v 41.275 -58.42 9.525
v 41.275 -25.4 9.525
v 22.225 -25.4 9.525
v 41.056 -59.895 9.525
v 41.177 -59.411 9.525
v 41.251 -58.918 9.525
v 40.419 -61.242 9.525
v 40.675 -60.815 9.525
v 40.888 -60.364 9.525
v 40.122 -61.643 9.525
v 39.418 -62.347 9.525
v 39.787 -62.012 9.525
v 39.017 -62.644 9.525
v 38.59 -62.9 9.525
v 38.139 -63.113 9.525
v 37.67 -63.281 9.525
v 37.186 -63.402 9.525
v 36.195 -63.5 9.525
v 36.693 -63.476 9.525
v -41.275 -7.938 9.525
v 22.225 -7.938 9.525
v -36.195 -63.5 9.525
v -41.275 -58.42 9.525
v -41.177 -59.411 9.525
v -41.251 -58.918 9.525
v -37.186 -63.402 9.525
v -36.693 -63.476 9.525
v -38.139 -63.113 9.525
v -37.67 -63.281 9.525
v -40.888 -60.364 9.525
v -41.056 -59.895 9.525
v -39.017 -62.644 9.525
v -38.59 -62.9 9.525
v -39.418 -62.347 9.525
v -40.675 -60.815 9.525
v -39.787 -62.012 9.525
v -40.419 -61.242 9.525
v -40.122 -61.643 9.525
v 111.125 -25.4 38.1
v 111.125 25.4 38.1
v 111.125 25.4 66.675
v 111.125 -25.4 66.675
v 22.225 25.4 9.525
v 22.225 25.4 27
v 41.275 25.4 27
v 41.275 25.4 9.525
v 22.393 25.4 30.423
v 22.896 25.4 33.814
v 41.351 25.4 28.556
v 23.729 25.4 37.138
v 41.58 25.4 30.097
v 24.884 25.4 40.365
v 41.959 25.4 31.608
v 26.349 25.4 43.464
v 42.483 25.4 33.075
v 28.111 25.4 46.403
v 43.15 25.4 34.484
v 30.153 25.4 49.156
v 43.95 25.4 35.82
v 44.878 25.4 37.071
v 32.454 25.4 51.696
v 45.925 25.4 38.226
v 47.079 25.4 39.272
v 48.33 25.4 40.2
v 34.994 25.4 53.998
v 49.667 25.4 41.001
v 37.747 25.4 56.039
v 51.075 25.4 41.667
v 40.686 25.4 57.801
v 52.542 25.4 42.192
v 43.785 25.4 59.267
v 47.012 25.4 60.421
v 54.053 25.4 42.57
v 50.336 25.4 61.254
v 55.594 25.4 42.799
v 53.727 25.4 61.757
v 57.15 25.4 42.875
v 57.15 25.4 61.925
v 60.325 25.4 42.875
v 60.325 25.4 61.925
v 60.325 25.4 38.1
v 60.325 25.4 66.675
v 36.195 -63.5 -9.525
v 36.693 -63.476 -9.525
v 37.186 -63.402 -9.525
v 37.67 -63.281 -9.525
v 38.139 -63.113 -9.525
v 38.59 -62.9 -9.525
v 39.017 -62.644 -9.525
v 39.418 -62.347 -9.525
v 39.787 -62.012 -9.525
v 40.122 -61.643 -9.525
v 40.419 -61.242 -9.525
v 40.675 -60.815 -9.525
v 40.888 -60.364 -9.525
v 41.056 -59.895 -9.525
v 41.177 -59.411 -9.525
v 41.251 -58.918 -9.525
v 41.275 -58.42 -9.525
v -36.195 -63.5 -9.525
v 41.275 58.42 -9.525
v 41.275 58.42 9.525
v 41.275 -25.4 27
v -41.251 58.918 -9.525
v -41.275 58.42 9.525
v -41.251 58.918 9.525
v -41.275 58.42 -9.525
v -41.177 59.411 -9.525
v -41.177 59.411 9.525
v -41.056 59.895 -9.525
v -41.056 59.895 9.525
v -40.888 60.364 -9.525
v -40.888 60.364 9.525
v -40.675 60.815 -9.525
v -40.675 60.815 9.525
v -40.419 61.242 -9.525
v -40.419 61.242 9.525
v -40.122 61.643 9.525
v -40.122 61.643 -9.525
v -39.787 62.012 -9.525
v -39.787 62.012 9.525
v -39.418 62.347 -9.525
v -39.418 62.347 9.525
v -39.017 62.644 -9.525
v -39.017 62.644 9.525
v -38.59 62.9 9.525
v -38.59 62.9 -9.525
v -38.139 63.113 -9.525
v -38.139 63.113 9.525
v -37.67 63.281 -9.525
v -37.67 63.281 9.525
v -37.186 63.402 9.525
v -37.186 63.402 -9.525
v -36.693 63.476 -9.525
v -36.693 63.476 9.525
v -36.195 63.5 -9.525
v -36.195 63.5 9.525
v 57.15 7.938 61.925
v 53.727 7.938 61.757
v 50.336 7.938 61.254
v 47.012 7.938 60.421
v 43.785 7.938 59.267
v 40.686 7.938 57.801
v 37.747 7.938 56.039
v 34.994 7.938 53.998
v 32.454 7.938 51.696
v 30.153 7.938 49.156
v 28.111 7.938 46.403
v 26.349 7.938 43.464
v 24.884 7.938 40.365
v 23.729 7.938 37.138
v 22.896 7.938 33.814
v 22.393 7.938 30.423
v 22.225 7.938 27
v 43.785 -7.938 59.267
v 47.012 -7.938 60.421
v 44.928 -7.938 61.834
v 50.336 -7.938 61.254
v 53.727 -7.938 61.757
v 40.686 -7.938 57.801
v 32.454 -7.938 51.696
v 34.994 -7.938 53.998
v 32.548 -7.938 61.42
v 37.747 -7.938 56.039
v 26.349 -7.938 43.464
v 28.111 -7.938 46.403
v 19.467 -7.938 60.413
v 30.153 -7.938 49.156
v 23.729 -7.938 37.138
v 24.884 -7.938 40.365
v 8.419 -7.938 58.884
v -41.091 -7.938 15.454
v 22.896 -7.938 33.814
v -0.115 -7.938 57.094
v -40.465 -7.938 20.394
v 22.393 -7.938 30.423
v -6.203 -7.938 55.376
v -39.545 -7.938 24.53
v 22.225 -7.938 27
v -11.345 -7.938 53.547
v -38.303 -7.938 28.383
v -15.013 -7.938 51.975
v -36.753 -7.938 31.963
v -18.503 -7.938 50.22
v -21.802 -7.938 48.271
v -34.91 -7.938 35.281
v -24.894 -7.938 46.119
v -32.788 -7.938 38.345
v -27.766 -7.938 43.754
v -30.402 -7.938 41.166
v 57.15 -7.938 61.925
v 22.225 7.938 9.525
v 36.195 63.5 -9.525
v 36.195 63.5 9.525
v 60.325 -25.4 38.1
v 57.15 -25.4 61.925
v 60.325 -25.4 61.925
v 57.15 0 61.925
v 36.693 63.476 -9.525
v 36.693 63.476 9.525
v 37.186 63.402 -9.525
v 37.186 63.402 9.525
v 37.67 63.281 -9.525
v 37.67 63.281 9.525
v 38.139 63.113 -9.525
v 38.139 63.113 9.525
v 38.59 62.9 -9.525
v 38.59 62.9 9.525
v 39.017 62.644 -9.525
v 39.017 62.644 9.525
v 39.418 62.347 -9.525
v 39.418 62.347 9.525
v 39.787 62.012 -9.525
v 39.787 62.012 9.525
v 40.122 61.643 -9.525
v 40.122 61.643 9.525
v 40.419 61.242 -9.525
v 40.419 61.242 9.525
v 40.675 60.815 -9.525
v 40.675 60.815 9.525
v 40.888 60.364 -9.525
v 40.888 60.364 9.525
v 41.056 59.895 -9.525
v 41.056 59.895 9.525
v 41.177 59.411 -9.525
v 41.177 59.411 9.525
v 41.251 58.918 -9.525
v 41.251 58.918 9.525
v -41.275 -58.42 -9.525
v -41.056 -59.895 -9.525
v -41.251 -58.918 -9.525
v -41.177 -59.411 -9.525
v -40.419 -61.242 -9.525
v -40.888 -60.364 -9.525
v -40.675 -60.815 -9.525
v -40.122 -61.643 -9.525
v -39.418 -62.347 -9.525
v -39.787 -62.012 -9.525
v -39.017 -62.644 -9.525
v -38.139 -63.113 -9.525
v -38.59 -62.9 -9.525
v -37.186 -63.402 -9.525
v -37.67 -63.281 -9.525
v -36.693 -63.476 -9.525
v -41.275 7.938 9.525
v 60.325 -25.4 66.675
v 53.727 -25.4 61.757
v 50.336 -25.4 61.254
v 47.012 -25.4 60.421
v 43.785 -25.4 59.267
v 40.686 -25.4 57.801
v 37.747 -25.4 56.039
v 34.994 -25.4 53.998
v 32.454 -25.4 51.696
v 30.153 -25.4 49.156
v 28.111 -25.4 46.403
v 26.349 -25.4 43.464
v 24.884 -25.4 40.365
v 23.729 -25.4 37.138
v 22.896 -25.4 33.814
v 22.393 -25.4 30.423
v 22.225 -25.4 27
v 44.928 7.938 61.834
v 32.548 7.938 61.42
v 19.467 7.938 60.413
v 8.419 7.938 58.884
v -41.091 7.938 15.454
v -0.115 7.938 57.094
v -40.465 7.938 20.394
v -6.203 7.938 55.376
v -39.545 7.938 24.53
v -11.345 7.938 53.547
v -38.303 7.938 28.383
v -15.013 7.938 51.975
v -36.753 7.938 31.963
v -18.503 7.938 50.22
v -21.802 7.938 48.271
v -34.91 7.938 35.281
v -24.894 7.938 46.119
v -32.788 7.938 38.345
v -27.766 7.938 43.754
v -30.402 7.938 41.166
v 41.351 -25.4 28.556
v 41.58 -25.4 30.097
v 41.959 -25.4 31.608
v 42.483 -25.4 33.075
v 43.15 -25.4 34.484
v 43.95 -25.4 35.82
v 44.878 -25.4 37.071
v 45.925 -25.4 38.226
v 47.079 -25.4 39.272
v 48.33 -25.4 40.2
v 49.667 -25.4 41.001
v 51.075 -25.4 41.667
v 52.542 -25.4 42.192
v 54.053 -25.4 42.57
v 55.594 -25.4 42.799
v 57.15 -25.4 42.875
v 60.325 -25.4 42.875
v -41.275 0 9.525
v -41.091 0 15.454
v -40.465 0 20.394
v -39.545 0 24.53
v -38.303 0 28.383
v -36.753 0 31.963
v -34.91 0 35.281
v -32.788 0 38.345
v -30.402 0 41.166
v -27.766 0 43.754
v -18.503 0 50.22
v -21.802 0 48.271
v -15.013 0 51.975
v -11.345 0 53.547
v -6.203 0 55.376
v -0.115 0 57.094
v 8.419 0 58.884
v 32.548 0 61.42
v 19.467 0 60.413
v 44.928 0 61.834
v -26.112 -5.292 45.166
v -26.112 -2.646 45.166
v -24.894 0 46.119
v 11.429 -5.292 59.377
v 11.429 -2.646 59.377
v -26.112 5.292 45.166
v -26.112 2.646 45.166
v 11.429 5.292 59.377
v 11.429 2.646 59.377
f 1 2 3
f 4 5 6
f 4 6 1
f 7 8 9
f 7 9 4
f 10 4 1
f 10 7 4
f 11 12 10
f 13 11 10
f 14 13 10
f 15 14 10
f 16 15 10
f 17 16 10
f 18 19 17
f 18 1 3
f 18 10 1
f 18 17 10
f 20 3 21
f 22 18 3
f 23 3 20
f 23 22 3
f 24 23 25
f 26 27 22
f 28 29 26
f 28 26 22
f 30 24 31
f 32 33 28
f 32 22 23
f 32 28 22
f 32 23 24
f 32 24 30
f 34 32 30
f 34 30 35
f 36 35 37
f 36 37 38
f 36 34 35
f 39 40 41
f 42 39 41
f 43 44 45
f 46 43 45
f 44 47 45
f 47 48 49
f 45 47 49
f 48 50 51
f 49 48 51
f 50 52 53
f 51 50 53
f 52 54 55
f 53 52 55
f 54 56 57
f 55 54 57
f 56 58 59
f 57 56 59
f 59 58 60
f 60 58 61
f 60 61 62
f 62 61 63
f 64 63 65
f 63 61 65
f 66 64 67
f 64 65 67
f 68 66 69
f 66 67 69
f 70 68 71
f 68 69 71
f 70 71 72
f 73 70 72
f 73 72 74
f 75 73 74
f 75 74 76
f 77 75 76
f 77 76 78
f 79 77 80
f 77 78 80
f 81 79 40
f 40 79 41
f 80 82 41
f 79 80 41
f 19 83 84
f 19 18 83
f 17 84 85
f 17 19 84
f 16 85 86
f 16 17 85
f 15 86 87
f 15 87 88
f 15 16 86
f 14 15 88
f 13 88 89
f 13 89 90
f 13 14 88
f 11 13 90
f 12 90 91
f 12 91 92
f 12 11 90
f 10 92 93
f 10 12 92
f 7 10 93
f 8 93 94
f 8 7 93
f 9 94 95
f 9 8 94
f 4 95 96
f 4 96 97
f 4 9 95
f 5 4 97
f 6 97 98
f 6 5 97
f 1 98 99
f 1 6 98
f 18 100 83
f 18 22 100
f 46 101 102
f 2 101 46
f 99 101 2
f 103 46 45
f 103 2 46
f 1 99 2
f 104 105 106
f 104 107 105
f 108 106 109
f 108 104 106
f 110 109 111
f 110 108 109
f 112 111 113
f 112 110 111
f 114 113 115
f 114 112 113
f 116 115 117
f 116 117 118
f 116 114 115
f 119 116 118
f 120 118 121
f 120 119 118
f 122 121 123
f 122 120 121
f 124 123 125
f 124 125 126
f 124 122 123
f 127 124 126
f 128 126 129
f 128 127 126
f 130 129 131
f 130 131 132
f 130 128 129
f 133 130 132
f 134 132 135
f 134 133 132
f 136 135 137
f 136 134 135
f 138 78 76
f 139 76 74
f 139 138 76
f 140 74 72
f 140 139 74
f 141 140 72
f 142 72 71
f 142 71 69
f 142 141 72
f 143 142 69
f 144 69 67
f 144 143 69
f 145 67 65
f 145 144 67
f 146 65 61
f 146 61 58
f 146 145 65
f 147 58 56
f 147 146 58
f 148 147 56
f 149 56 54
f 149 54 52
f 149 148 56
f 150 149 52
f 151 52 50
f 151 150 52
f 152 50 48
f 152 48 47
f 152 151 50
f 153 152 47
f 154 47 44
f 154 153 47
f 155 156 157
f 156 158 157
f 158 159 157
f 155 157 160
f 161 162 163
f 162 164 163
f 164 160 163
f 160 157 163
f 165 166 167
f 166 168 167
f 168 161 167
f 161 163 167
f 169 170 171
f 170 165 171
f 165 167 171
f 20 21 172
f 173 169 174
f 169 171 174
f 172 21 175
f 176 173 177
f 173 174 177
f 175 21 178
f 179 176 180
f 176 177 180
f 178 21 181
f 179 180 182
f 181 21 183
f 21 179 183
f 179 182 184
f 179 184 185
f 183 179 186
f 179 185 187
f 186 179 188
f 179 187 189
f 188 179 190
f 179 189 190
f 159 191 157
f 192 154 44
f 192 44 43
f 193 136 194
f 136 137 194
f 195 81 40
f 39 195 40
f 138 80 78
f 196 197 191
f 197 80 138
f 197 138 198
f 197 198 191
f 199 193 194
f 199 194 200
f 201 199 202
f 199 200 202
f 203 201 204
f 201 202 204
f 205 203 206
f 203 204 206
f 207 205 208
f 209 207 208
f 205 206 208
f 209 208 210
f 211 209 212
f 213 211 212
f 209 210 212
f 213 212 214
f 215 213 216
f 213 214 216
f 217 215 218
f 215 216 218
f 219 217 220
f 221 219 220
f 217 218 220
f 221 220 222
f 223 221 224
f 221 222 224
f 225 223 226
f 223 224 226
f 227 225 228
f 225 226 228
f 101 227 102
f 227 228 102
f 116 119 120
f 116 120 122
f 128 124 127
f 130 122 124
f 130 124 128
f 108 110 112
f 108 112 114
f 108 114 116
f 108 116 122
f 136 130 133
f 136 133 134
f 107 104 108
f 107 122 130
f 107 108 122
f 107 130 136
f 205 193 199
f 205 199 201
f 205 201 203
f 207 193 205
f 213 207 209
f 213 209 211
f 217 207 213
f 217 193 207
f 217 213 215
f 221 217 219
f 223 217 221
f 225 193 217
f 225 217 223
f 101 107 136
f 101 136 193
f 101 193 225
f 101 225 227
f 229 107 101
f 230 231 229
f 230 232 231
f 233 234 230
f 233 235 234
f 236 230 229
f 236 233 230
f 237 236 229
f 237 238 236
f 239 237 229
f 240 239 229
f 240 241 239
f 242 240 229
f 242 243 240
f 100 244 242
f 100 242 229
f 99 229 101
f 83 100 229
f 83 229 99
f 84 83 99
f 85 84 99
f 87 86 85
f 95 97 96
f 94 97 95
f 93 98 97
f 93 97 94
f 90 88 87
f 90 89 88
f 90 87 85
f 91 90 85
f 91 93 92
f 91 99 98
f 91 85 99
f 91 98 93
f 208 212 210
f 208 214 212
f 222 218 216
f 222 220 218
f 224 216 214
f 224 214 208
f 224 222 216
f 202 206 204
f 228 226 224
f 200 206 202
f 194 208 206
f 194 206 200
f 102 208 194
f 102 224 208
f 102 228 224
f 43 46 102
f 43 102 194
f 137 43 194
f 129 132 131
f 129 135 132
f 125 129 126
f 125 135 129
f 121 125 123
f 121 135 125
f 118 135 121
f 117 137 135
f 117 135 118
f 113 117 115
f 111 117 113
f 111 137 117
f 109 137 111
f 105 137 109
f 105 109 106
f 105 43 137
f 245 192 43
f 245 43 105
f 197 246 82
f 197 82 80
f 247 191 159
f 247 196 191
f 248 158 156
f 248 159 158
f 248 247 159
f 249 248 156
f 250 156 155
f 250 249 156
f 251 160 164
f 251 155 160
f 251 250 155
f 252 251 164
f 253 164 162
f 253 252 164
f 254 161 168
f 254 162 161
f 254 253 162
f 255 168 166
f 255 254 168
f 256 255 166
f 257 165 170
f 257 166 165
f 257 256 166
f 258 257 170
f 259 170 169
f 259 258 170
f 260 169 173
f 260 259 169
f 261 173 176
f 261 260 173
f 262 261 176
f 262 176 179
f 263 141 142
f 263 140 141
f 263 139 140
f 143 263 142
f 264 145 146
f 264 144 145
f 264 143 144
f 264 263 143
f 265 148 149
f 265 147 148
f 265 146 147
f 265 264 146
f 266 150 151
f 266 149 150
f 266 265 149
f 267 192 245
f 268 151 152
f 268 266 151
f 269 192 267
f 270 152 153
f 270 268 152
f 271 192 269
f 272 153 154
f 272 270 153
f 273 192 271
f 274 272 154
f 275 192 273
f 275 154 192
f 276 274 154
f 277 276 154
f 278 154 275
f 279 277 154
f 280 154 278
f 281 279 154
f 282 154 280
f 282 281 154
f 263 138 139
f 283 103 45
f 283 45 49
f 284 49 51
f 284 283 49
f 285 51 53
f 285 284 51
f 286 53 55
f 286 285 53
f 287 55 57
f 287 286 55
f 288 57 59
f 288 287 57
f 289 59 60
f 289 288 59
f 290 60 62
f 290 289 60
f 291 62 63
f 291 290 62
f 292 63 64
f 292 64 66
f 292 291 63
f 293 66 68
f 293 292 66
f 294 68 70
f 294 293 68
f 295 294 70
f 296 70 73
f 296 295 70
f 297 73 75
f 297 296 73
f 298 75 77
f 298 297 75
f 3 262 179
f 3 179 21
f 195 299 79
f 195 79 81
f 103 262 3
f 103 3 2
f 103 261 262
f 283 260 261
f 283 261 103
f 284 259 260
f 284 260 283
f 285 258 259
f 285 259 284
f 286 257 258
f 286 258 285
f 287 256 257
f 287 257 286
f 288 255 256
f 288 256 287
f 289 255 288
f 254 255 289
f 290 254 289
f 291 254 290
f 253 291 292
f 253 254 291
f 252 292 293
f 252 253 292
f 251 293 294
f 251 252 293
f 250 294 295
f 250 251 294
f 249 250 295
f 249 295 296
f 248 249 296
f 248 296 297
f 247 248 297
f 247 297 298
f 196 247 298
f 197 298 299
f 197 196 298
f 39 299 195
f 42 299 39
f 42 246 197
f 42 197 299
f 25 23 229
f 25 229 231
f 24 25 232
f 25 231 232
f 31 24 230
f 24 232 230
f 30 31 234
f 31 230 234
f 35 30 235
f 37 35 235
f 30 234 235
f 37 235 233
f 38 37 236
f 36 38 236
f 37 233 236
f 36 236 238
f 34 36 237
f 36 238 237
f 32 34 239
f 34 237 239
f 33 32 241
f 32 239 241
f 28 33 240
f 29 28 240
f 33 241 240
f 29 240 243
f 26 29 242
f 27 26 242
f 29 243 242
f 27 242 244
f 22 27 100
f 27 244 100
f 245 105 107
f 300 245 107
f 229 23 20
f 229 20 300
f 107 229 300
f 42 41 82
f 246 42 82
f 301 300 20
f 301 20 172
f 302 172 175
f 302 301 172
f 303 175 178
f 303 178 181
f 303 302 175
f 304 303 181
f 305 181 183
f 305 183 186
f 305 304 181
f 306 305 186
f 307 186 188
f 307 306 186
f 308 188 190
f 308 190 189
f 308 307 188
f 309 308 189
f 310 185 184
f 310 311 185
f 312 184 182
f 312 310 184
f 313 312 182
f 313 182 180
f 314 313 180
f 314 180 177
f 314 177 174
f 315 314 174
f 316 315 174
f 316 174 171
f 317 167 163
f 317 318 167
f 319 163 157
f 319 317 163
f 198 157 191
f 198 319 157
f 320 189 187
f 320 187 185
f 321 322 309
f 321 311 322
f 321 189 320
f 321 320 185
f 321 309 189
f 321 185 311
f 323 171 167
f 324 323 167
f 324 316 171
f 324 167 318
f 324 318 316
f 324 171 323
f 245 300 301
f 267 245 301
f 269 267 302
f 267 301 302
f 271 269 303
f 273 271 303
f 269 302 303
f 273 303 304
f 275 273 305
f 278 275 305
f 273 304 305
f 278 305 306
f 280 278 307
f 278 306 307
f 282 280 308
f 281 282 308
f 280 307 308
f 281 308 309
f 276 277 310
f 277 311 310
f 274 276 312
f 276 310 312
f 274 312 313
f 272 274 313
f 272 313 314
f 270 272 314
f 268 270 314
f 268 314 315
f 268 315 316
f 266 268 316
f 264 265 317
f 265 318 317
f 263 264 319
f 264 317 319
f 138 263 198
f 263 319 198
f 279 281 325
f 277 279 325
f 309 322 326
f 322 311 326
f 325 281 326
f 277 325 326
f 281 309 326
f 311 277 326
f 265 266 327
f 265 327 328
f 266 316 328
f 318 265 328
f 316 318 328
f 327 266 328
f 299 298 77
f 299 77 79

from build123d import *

# Parameters (mm, degrees)
F1_DEPTH = 63.5
F2_DEPTH = 25.4
F3_DEPTH = 7.9375
F4_R     = 5.08


with BuildPart() as f1:
    # F0 (on Front) → F1 (new body, symmetric)
    with BuildSketch(Plane.XZ):
        Polygon((22.225, 9.525), (-41.275, 9.525), (-41.275, -9.525), (41.275, -9.525), (41.275, 9.525), align=None)
    extrude(amount=F1_DEPTH, both=True)

    # F0 (on Front) → F2 (join, symmetric)
    with BuildSketch(Plane.XZ):
        with BuildLine():
            Line((22.225, 27.0002), (22.225, 9.525))
            Line((22.225, 9.525), (41.275, 9.525))
            Line((41.275, 9.525), (41.275, 27.0002))
            ThreePointArc((41.275, 27.0002), (45.92468, 38.22552), (57.15, 42.8752))
            Line((57.15, 42.8752), (60.325, 42.8752))
            Line((60.325, 42.8752), (60.325, 61.9252))
            Line((60.325, 61.9252), (57.15, 61.9252))
            ThreePointArc((57.15, 61.9252), (32.454296, 51.695904), (22.225, 27.0002))
        make_face()
        Polygon((60.325, 66.675), (60.325, 61.9252), (60.325, 42.8752), (60.325, 38.1), (111.125, 38.1), (111.125, 66.675), align=None)
    extrude(amount=F2_DEPTH, both=True)

    # F0 (on Front) → F3 (join, symmetric)
    with BuildSketch(Plane.XZ):
        with BuildLine():
            add(Edge.make_bspline(
                [(-41.275, 9.525), (-42.032037, 59.136383), (12.069872, 61.952318), (57.15, 61.9252)],
                knots=[0, 0, 0, 0, 111.504536, 111.504536, 111.504536, 111.504536], degree=3))
            Line((-41.275, 9.525), (22.225, 9.525))
            Line((22.225, 9.525), (22.225, 27.0002))
            ThreePointArc((22.225, 27.0002), (32.454296, 51.695904), (57.15, 61.9252))
        make_face()
    extrude(amount=F3_DEPTH, both=True)

    # F4
    f4_edges = [f1.edges().sort_by_distance(p)[0] for p in [
        (-41.275, -63.5, 0),
        (41.275, -63.5, 0),
        (41.275, 63.5, 0),
        (-41.275, 63.5, 0),
    ]]
    fillet(f4_edges, radius=F4_R)


solid = f1.part
